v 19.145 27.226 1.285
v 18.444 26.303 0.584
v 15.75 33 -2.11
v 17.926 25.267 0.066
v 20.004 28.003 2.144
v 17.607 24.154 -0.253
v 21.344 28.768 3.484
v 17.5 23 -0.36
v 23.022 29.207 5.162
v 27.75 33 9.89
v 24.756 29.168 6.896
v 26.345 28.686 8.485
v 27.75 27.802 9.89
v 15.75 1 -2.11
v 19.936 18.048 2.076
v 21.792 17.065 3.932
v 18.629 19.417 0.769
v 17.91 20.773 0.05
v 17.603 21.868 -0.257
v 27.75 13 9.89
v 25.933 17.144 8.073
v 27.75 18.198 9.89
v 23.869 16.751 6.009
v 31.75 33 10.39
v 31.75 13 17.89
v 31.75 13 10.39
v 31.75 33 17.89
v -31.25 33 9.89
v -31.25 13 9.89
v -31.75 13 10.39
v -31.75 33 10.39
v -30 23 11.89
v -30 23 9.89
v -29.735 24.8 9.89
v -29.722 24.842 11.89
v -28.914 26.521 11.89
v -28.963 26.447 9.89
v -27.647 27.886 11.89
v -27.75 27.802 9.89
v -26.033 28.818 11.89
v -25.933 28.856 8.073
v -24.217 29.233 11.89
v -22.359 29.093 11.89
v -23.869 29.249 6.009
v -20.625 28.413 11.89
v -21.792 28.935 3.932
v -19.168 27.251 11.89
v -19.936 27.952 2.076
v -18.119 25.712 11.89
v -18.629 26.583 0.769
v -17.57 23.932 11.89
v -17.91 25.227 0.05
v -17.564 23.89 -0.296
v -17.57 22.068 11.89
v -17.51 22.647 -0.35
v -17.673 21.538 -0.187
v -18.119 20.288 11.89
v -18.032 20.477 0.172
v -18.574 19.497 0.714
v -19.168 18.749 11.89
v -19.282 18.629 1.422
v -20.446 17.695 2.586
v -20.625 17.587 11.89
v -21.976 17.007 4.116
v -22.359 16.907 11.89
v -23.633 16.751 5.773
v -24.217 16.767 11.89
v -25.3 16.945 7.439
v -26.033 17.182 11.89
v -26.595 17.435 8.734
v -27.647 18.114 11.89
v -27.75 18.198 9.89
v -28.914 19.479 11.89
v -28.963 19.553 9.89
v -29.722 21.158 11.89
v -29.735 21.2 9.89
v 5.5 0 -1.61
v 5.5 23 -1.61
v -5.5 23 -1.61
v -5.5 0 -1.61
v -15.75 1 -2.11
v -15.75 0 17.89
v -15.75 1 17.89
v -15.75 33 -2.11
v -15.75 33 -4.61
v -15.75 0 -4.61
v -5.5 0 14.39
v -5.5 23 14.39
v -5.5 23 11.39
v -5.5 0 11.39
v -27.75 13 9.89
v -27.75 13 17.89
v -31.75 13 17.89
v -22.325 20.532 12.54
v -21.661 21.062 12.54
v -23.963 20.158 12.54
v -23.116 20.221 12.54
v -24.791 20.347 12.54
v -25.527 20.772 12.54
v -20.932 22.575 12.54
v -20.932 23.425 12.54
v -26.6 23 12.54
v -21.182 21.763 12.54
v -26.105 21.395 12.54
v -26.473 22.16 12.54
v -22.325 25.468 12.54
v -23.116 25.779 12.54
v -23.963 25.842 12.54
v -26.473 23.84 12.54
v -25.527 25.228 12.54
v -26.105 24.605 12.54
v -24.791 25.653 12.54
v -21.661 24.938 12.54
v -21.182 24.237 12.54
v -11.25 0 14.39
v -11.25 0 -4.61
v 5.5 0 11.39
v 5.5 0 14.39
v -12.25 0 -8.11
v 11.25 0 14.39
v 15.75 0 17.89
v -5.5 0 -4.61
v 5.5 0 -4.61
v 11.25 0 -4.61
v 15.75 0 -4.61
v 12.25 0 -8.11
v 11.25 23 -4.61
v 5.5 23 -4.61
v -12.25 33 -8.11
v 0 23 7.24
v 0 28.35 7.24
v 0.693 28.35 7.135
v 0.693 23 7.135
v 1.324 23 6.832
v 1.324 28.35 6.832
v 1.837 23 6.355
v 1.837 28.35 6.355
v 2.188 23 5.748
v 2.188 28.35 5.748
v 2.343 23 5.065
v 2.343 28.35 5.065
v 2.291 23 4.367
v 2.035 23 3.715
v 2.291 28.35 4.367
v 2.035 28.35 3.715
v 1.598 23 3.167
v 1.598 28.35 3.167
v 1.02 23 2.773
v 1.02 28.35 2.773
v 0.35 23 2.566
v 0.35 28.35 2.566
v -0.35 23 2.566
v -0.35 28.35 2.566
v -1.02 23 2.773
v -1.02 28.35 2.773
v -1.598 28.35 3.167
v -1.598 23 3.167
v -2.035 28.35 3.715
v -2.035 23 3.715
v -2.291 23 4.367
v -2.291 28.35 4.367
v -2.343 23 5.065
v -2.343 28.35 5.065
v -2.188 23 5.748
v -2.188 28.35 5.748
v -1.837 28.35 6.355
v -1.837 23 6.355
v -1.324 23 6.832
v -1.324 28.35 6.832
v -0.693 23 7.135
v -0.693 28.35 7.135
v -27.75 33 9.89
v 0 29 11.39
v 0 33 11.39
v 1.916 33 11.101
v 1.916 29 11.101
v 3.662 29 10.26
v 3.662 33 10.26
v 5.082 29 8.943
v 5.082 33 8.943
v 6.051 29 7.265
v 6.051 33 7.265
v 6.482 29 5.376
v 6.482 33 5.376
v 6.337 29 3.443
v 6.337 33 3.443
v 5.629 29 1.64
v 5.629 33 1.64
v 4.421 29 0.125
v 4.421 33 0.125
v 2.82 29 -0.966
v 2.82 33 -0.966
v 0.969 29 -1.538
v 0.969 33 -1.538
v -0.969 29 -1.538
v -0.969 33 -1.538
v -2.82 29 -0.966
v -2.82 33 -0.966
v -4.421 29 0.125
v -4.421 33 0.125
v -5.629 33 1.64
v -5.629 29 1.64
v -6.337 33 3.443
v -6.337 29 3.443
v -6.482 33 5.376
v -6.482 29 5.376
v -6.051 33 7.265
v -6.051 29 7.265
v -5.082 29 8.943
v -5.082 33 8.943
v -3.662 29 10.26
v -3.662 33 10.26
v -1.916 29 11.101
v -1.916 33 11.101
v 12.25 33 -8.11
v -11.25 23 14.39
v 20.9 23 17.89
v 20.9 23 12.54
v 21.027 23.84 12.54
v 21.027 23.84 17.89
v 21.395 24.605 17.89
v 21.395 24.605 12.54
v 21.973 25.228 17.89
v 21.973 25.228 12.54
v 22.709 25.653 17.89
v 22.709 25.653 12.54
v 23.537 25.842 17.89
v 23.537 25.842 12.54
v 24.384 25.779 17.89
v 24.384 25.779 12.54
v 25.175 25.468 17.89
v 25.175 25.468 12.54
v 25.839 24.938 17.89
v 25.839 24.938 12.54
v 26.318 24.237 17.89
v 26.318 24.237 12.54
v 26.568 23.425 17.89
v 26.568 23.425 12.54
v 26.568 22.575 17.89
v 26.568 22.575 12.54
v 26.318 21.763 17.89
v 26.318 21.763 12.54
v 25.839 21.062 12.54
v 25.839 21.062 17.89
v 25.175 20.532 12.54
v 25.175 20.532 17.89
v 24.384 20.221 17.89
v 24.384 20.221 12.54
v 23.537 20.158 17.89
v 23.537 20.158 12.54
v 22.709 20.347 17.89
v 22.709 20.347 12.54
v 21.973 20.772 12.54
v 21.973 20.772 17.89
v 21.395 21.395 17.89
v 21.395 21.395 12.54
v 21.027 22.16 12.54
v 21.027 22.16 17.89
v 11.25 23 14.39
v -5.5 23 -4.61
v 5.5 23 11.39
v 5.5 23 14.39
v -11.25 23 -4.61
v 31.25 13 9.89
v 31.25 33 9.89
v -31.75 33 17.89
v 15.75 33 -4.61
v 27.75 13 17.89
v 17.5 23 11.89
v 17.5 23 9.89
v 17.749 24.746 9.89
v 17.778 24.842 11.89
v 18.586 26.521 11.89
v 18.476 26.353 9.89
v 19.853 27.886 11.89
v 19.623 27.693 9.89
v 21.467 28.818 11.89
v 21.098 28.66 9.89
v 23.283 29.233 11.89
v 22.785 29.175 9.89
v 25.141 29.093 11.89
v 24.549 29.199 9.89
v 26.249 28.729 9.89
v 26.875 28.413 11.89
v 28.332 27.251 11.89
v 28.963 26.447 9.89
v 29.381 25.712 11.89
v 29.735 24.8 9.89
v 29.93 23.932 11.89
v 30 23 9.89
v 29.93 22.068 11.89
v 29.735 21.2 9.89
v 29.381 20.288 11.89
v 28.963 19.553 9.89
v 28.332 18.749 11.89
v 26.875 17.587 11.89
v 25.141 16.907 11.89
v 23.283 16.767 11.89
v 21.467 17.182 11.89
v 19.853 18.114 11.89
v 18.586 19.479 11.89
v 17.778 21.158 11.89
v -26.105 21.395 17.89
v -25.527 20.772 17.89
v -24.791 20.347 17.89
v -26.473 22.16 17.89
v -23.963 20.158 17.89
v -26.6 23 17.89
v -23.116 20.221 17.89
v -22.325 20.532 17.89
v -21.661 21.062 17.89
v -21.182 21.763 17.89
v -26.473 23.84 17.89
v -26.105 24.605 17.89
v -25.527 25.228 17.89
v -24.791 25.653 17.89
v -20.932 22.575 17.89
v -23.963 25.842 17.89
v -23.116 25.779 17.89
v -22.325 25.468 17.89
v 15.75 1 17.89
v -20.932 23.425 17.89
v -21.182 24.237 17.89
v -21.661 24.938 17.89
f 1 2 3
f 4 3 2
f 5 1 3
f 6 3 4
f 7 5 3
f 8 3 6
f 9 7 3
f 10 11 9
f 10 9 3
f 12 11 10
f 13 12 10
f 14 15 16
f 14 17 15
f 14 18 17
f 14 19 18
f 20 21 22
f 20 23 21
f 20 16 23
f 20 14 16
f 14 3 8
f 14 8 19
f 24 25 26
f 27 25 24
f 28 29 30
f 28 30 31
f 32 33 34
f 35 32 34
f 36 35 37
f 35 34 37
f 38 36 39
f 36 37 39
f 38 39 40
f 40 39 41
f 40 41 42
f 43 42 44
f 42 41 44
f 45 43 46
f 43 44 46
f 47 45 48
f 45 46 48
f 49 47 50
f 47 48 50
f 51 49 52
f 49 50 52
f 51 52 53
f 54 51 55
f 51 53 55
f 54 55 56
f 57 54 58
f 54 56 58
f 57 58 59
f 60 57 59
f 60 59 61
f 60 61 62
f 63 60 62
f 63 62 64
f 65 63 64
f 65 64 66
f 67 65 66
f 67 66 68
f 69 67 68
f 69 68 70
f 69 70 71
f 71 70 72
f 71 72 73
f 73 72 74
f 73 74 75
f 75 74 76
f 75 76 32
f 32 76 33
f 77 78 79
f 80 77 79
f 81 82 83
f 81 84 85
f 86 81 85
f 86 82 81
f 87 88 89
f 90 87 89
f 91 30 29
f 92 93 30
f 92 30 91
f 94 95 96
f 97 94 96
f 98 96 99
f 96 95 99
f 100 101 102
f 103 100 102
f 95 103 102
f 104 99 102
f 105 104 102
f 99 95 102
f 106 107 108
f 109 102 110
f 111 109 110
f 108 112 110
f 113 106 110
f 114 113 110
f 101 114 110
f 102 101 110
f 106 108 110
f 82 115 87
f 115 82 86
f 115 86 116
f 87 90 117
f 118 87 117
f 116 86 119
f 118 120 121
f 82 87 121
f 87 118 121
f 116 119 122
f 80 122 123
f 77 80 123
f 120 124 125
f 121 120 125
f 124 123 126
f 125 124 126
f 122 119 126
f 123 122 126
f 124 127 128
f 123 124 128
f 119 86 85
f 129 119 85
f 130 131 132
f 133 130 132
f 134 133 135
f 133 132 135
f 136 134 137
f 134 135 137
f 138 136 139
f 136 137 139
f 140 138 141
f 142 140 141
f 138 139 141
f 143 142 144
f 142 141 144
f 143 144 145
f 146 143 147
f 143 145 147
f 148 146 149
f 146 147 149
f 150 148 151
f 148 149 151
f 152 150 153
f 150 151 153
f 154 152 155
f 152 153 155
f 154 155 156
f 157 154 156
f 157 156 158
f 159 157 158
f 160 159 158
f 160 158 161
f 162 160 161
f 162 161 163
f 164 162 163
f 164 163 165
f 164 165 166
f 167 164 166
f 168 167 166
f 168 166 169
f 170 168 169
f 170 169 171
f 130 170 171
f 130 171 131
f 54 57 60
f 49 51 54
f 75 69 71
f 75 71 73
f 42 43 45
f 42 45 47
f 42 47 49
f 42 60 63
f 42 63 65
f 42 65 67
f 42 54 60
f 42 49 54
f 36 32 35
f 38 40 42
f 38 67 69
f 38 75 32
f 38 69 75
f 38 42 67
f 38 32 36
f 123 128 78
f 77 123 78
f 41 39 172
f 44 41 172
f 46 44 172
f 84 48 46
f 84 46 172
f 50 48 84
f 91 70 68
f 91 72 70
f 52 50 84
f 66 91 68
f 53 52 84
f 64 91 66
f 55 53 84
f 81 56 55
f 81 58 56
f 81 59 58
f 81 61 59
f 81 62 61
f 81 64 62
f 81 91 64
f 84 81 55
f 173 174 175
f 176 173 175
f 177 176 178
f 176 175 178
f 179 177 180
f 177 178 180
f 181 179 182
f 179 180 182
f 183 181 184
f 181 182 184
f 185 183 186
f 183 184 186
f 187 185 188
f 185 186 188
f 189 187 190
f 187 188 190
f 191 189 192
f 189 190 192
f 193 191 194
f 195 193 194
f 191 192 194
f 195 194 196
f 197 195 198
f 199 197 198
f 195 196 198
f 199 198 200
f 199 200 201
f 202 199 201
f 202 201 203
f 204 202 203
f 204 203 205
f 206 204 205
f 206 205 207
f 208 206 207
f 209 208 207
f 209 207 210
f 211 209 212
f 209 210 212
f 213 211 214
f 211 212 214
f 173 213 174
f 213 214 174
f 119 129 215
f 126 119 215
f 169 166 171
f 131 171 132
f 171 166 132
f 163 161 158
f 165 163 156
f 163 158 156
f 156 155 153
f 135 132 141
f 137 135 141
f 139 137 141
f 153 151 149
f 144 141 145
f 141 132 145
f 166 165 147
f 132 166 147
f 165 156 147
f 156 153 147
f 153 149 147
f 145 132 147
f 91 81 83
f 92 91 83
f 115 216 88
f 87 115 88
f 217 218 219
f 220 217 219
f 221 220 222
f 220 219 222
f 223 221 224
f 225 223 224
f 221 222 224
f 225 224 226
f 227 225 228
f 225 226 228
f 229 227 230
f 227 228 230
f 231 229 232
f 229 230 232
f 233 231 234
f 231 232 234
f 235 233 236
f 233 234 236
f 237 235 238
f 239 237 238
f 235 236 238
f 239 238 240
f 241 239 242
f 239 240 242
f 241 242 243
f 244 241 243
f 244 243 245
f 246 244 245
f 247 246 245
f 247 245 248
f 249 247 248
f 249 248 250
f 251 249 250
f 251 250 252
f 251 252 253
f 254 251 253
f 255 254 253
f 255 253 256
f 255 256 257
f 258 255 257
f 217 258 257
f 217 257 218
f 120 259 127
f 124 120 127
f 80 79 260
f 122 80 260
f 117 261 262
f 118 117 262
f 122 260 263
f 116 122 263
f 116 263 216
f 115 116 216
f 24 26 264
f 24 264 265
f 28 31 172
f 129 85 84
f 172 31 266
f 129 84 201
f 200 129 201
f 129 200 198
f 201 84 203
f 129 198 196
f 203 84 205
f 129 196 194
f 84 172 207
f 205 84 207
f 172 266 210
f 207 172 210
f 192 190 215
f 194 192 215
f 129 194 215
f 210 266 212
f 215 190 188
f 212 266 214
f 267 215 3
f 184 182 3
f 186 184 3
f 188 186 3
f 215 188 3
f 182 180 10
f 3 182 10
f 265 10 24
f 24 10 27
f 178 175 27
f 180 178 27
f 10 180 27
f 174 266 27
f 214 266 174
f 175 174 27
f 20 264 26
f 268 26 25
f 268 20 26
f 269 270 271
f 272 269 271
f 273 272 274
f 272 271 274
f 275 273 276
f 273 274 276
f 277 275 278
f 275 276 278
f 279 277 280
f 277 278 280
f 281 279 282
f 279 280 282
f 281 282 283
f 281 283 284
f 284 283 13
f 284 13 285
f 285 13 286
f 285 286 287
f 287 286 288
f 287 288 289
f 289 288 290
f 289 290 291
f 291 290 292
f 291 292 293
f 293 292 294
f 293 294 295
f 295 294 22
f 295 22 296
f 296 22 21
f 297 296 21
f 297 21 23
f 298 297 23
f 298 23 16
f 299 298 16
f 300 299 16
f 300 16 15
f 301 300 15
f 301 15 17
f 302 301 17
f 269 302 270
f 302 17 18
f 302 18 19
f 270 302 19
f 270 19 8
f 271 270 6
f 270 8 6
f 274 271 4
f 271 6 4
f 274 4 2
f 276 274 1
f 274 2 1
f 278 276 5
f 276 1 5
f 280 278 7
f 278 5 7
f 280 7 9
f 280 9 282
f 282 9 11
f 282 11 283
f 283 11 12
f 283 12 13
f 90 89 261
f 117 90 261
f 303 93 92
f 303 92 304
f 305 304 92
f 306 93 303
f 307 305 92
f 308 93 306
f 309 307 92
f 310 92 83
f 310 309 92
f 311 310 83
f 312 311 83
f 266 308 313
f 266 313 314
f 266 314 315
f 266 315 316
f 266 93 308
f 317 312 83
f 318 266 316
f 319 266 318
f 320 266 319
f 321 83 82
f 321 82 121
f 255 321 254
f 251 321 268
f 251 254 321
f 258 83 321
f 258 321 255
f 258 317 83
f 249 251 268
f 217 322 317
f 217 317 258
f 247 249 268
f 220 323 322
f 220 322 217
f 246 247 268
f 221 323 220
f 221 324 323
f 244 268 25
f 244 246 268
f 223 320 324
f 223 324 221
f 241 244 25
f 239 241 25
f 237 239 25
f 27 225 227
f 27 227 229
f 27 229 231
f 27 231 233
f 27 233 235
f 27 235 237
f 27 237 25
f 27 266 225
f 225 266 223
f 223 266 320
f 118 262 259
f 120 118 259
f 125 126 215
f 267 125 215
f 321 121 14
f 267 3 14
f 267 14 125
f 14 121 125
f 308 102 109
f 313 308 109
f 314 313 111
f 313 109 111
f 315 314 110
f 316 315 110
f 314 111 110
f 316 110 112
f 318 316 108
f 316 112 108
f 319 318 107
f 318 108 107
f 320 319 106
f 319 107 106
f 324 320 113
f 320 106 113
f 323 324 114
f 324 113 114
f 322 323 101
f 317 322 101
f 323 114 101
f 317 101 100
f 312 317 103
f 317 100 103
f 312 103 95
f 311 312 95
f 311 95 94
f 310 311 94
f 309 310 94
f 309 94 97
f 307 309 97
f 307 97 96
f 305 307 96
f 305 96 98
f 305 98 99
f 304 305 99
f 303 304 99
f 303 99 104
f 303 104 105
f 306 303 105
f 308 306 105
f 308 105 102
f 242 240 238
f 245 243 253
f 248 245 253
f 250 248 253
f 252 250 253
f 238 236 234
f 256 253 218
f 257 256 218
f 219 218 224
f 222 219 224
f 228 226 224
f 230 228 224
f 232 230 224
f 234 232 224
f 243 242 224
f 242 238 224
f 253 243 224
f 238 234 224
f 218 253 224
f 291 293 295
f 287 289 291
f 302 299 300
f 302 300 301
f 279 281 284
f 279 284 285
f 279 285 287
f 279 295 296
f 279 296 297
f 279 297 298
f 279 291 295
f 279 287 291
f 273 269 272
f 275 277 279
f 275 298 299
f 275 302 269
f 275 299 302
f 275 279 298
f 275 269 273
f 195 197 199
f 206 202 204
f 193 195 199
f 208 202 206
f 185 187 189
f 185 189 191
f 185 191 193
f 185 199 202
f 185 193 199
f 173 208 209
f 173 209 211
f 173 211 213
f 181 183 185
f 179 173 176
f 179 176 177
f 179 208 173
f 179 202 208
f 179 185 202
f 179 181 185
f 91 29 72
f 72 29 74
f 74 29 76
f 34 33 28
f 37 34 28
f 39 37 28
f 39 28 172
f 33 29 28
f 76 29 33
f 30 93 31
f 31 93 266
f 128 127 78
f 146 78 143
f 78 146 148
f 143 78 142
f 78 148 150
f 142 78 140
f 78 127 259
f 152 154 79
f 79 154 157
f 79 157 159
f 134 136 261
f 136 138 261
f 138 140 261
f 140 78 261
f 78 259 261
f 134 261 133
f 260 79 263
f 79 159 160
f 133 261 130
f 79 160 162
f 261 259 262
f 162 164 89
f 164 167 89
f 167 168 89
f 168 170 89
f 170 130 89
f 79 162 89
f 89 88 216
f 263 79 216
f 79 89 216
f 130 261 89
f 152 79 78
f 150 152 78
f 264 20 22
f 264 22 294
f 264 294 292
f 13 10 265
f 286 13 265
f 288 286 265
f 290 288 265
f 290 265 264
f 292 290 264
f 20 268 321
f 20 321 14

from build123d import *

# Parameters (mm, degrees)
SKETCH1_W           = 31.5
SKETCH1_H           = 26
BOSS_EXTRUDE1_DEPTH = 33
SKETCH8_W           = 16
SKETCH8_H           = 20
BOSS_EXTRUDE2_DEPTH = 8
CUT_EXTRUDE1_START  = 10
CUT_EXTRUDE1_DEPTH  = 40.164116391
SKETCH3_R           = 2.85
CUT_EXTRUDE2_DEPTH  = 50.204293512
SKETCH6_R           = 6.25
CUT_EXTRUDE5_DEPTH  = 2
SKETCH4_R           = 2.35
CUT_EXTRUDE3_DEPTH  = 50.164116391
SKETCH5_R           = 6.5
CUT_EXTRUDE4_DEPTH  = 4
CHAMFER1_SIZE       = 3.5
CHAMFER3_SIZE       = 0.5
CHAMFER4_SIZE       = 12
CHAMFER5_SIZE       = 12
SKETCH10_R          = 4.428091906
BOSS_EXTRUDE4_DEPTH = 0.65
SKETCH11_R          = 4.527005536
SKETCH11_R_2        = 4.450513295
BOSS_EXTRUDE5_DEPTH = 0.65


with BuildPart() as part:
    # Sketch1 → Boss-Extrude1 (new body)
    with BuildSketch(Plane(origin=(0, 0, 0), x_dir=(1, 0, 0), z_dir=(0, 1, 0))):
        with Locations((0, -4.889880952)):
            Rectangle(SKETCH1_W, SKETCH1_H)
    extrude(amount=BOSS_EXTRUDE1_DEPTH)

    # Sketch8 → Boss-Extrude2 (add)
    with BuildSketch(Plane.XY.offset(17.889880952)):
        with Locations((23.75, 23)):
            Rectangle(SKETCH8_W, SKETCH8_H)
        with Locations((-23.75, 23)):
            Rectangle(SKETCH8_W, SKETCH8_H)
    extrude(amount=-BOSS_EXTRUDE2_DEPTH)

    # Sketch2 → Cut-Extrude1 (cut, through all)
    with BuildSketch(Plane.XZ.offset(-33).offset(CUT_EXTRUDE1_START)):
        Polygon((-11.25, 14.389880952), (-5.5, 14.389880952), (-5.5, 11.389880952), (5.5, 11.389880952), (5.5, 14.389880952), (11.25, 14.389880952), (11.25, -4.610119048), (5.5, -4.610119048), (5.5, -1.610119048), (-5.5, -1.610119048), (-5.5, -4.610119048), (-11.25, -4.610119048), align=None)
    extrude(amount=CUT_EXTRUDE1_DEPTH, mode=Mode.SUBTRACT)

    # Sketch3 → Cut-Extrude2 (cut, through all)
    with BuildSketch(Plane(origin=(0, 0, 9.889880952), x_dir=(-1, 0, 0), z_dir=(0, 0, -1))):
        with Locations((-23.75, 23)):
            Circle(SKETCH3_R)
        with Locations((23.75, 23)):
            Circle(SKETCH3_R)
    extrude(amount=-CUT_EXTRUDE2_DEPTH, mode=Mode.SUBTRACT)

    # Sketch6 → Cut-Extrude5 (cut)
    with BuildSketch(Plane(origin=(0, 0, 9.889880952), x_dir=(-1, 0, 0), z_dir=(0, 0, -1))):
        with Locations((-23.75, 23)):
            Circle(SKETCH6_R)
        with Locations((23.75, 23)):
            Circle(SKETCH6_R)
    extrude(amount=-CUT_EXTRUDE5_DEPTH, mode=Mode.SUBTRACT)

    # Sketch4 → Cut-Extrude3 (cut, through all)
    with BuildSketch(Plane(origin=(0, 33, 0), x_dir=(1, 0, 0), z_dir=(0, 1, 0))):
        with Locations(Location((0, -4.889880952, 0), (0, 0, 270))):
            Circle(SKETCH4_R)
    extrude(amount=-CUT_EXTRUDE3_DEPTH, mode=Mode.SUBTRACT)

    # Sketch5 → Cut-Extrude4 (cut)
    with BuildSketch(Plane(origin=(0, 33, 0), x_dir=(1, 0, 0), z_dir=(0, 1, 0))):
        with Locations(Location((0, -4.889880952, 0), (0, 0, 270))):
            Circle(SKETCH5_R)
    extrude(amount=-CUT_EXTRUDE4_DEPTH, mode=Mode.SUBTRACT)

    # Chamfer1
    chamfer1_edges = [part.edges().sort_by_distance(p)[0] for p in [
        (-15.75, 16.5, -8.110119048),
        (15.75, 16.5, -8.110119048),
    ]]
    chamfer(chamfer1_edges, length=CHAMFER1_SIZE)

    # Chamfer3
    chamfer3_edges = [part.edges().sort_by_distance(p)[0] for p in [
        (31.75, 23, 9.889880952),
        (-31.75, 23, 9.889880952),
    ]]
    chamfer(chamfer3_edges, length=CHAMFER3_SIZE)

    # Chamfer4
    # the kernel refuses this chamfer: 12 mm, written as the material it adds along each edge
    with BuildSketch(Plane(origin=(15.75, 13, 9.889880952), x_dir=(-0.027495876610586348, 0, -0.9996219169112968), z_dir=(0, 1, 0))) as chamfer4_piece_1_section:
        Polygon((CHAMFER4_SIZE * 0.999621916911, -CHAMFER4_SIZE * 0.0274958766106), (-CHAMFER4_SIZE * 0.0274958766106, -CHAMFER4_SIZE * 0.999621916911), (0, 0), align=None)
    chamfer4_piece_1 = extrude(amount=20, mode=Mode.PRIVATE)
    chamfer4_piece_1 = chamfer4_piece_1 - Plane(origin=(23.75, 23, -0.26462775), x_dir=(-1, 0, 0), z_dir=(0, 0, -1)) * Cylinder(6.25, 88, mode=Mode.PRIVATE)
    add(chamfer4_piece_1)
    with BuildSketch(Plane(origin=(-15.75, 13, 9.889880952), x_dir=(-0.9996219169112969, 0, 0.027495876610586348), z_dir=(0, 1, 0))) as chamfer4_piece_2_section:
        Polygon((CHAMFER4_SIZE * 0.999621916911, -CHAMFER4_SIZE * 0.0274958766106), (-CHAMFER4_SIZE * 0.0274958766106, -CHAMFER4_SIZE * 0.999621916911), (0, 0), align=None)
    chamfer4_piece_2 = extrude(amount=20, mode=Mode.PRIVATE)
    chamfer4_piece_2 = chamfer4_piece_2 - Plane(origin=(-23.75, 23, 8.187920604), x_dir=(-1, 0, 0), z_dir=(0, 0, -1)) * Cylinder(6.25, 88, mode=Mode.PRIVATE)
    add(chamfer4_piece_2)

    # Chamfer5
    chamfer5_edges = [part.edges().sort_by_distance(p)[0] for p in [
        (-15.75, 13, 7.889880952),
        (15.75, 13, 7.889880952),
    ]]
    chamfer(chamfer5_edges, length=CHAMFER5_SIZE)

    # Sketch10 → Boss-Extrude4 (add)
    with BuildSketch(Plane(origin=(0, 29, 0), x_dir=(1, 0, 0), z_dir=(0, 1, 0))):
        with Locations((0, -4.889880952)):
            Circle(SKETCH10_R)
    extrude(amount=-BOSS_EXTRUDE4_DEPTH)

    # Sketch11 → Boss-Extrude5 (add)
    with BuildSketch(Plane(origin=(0, 0, 11.889880952), x_dir=(-1, 0, 0), z_dir=(0, 0, -1))):
        with Locations((-23.75, 23)):
            Circle(SKETCH11_R)
        with Locations((23.75, 23)):
            Circle(SKETCH11_R_2)
    extrude(amount=-BOSS_EXTRUDE5_DEPTH)


solid = part.part
